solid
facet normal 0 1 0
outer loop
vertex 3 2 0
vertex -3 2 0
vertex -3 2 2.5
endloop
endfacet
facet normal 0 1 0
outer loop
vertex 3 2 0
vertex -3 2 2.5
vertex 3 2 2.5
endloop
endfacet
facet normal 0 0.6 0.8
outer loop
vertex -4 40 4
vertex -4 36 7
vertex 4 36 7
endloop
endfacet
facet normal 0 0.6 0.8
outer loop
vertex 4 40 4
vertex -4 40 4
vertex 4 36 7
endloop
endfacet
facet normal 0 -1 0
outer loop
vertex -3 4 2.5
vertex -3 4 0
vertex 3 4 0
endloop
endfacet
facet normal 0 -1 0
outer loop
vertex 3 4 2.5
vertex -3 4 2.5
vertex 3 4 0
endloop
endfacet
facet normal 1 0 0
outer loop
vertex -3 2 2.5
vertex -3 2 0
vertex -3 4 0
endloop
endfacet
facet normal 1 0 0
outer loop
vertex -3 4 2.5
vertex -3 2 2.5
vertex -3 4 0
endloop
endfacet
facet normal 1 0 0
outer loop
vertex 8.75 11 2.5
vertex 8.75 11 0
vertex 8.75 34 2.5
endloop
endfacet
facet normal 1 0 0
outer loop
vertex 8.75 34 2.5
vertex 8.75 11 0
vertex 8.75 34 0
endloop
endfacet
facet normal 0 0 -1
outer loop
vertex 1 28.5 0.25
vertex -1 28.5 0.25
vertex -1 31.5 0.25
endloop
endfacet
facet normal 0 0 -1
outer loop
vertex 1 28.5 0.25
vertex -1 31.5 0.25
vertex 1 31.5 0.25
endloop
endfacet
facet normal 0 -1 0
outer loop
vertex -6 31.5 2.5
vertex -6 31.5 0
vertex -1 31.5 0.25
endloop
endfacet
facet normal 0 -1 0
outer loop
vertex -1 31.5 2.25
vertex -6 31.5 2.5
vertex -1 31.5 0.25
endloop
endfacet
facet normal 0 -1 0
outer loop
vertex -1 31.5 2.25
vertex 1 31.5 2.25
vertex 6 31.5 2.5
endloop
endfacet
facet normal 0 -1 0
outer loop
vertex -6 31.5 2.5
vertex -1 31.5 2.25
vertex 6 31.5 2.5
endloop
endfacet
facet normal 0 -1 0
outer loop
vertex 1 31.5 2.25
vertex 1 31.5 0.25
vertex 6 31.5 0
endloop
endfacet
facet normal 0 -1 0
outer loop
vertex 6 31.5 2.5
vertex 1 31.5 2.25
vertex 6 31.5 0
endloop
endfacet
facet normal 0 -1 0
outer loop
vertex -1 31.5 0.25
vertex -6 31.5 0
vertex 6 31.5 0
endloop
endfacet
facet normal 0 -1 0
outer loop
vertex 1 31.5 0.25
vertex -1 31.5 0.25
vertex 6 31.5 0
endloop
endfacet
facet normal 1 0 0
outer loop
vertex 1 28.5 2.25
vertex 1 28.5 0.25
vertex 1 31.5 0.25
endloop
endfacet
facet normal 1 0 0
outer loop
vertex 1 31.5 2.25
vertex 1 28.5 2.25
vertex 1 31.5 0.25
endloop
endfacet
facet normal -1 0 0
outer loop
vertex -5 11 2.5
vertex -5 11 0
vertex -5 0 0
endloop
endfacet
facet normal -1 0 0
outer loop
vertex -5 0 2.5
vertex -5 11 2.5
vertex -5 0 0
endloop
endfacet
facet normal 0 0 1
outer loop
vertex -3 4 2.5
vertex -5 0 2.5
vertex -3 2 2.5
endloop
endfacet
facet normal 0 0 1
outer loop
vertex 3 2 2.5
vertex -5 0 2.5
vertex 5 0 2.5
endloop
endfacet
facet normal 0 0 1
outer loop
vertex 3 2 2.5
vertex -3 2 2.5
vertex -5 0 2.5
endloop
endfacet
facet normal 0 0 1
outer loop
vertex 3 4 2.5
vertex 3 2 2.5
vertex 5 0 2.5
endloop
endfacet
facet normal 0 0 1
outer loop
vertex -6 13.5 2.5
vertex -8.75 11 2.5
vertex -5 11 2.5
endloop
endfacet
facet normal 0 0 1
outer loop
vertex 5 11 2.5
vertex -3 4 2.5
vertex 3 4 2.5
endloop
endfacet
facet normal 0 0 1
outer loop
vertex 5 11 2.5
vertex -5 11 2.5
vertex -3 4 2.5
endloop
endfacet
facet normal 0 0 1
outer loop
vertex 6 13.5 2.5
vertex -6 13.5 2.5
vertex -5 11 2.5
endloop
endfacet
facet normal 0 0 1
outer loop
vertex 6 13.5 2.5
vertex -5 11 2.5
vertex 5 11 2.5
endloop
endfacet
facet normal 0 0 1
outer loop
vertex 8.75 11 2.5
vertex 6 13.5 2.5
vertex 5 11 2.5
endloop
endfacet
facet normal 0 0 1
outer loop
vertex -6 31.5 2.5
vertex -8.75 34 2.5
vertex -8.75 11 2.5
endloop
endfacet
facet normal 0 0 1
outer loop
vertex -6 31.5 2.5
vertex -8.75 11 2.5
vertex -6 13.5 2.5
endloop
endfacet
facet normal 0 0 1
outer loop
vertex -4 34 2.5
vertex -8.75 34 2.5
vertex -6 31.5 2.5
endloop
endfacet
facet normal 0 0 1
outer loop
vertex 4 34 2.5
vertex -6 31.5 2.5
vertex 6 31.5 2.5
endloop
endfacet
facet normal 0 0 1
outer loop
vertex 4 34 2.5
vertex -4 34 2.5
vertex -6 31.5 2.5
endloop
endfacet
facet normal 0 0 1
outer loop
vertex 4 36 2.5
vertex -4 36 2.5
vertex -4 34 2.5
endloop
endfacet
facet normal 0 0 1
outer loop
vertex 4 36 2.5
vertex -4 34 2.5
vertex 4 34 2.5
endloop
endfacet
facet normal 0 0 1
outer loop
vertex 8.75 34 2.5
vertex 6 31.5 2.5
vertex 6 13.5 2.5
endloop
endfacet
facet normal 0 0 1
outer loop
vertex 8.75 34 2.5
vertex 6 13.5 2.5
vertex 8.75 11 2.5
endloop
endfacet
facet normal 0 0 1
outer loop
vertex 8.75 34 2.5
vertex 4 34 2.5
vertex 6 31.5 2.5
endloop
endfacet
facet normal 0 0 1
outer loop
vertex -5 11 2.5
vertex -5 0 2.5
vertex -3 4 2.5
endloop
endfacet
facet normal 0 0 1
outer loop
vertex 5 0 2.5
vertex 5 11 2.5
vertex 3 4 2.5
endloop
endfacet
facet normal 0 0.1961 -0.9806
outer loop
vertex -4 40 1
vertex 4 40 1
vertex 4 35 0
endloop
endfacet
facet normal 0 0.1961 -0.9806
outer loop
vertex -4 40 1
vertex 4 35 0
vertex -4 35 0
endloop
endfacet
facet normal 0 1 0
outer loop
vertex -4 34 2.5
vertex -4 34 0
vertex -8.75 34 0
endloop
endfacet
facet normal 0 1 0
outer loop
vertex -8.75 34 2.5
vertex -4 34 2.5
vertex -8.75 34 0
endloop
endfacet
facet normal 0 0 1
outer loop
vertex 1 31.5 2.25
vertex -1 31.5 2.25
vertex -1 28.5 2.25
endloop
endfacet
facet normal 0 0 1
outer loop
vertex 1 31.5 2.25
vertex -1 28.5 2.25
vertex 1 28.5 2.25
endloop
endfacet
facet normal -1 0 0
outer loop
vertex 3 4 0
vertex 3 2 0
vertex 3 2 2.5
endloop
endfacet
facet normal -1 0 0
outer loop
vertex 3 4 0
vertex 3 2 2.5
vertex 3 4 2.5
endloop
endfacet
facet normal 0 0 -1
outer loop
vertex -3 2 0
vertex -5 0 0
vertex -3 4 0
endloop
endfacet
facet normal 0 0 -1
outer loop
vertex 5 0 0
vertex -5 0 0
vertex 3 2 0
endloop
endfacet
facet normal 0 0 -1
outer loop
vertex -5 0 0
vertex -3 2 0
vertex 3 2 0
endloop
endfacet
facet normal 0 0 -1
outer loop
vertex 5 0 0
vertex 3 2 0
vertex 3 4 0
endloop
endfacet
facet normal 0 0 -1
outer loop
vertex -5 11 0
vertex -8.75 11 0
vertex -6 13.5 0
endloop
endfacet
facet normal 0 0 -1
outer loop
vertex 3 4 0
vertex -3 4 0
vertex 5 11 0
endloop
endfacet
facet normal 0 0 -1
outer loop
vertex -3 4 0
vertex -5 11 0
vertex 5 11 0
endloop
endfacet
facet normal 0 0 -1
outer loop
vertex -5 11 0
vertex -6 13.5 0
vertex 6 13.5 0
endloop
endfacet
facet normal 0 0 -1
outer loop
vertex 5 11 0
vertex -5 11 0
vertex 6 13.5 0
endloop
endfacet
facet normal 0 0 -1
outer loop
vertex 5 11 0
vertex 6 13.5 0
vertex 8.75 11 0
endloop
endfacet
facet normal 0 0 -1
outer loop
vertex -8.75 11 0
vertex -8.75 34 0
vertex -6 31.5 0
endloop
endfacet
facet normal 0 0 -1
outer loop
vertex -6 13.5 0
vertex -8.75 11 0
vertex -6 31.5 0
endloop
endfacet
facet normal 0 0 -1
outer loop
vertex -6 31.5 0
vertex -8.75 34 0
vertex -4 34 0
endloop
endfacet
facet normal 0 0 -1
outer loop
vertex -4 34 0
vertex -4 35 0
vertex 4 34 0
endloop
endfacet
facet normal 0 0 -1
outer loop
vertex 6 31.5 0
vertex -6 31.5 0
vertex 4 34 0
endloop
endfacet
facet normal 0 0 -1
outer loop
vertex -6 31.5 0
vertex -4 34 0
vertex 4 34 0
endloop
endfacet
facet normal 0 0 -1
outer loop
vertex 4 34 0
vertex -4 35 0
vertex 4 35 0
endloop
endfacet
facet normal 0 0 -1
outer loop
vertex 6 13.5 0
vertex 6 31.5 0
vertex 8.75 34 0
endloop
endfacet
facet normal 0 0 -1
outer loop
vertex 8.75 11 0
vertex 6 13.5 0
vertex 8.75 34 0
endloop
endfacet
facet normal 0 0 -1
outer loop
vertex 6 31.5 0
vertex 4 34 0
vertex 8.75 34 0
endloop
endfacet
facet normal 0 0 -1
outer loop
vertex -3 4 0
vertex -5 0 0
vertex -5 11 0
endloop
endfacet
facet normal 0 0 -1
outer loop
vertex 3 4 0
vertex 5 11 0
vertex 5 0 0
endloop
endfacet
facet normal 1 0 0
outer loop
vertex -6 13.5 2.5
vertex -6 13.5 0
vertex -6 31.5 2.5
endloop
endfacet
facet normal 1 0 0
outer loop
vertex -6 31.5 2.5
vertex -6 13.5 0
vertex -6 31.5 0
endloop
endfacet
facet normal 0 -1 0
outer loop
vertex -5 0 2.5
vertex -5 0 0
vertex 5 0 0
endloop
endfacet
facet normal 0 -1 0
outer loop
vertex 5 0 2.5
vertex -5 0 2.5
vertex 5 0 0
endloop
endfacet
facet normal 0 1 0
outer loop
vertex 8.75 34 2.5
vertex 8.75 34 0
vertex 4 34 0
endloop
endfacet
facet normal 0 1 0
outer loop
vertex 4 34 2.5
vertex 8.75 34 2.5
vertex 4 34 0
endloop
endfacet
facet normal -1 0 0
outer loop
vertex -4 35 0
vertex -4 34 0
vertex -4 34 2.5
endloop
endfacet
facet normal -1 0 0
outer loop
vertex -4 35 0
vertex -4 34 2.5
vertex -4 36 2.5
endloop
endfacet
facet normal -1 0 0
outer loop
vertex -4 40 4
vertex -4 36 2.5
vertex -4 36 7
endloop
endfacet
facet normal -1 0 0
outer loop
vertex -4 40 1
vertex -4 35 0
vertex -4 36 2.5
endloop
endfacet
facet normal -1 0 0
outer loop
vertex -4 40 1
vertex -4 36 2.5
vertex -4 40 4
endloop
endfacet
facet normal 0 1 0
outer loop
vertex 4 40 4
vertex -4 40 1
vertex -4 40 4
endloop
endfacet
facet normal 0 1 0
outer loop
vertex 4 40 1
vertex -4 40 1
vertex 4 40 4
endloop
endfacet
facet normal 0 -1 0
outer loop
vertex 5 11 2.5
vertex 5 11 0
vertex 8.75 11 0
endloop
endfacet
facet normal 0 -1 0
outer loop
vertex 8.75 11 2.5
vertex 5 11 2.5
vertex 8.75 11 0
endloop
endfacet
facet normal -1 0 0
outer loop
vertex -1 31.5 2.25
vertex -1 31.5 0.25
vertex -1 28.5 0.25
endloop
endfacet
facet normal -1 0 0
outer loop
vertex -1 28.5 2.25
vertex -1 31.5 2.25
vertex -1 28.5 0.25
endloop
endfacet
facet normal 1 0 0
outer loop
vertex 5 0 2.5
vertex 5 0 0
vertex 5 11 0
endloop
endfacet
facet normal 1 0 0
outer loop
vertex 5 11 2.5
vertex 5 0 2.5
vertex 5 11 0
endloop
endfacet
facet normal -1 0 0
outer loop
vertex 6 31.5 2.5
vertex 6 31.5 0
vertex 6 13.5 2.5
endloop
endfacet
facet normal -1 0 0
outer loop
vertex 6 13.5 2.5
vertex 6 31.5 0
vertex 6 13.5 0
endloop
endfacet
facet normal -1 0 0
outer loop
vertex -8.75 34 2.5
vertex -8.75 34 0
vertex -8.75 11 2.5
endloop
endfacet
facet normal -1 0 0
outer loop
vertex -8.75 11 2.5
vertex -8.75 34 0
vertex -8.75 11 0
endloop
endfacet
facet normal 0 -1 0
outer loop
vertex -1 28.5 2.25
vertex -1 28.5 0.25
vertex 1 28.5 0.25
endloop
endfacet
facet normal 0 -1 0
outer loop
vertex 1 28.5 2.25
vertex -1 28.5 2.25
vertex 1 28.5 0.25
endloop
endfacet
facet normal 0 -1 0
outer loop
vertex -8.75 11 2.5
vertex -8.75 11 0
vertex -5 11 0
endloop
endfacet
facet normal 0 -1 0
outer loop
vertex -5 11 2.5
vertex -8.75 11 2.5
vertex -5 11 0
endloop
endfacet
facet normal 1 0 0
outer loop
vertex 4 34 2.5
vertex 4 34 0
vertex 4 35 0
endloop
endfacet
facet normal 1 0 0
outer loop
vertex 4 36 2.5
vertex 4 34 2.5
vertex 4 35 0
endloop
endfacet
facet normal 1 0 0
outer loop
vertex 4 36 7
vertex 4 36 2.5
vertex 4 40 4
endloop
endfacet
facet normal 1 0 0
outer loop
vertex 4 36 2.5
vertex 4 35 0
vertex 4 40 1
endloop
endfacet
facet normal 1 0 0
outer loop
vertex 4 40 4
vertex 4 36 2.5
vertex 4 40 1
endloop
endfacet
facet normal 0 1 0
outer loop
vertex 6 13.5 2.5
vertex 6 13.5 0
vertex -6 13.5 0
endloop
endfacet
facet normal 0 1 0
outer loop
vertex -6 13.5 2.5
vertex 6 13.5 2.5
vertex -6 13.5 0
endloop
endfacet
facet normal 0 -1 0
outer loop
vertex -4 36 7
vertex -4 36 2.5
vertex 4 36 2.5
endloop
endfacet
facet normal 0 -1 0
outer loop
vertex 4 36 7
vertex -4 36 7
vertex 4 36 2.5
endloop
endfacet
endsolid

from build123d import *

# Parameters (mm, degrees)
F0_W     = 6
F0_H     = 2
F1_DEPTH = 2.5
F2_W     = 8
F2_H     = 4
F3_DEPTH = 4.5
F4_SIZE2 = 3.99999
F4_SIZE  = 2.99999
F5_SIZE2 = 1
F5_SIZE  = 5
F6_W     = 2
F6_H     = 3
F7_DEPTH = 0.25
F8_W     = 2
F8_H     = 3
F9_DEPTH = 0.25


# Not quite as in the source:
# - a fillet or chamfer is up to 0.001 mm smaller than in the source, because OpenCascade refuses the exact size


with BuildPart() as f1:
    # F0 (on Top) → F1 (new body)
    with BuildSketch(Plane.XY):
        Polygon((-5, 11), (-5, 0), (5, 0), (5, 11), (8.75, 11), (8.75, 34), (4, 34), (4, 40), (-4, 40), (-4, 34), (-8.75, 34), (-8.75, 11), align=None)
        with Locations((0, 3)):
            Rectangle(F0_W, F0_H, mode=Mode.SUBTRACT)
        Polygon((-6, 13.5), (-6, 31.5), (-1, 31.5), (-1, 28.5), (1, 28.5), (1, 31.5), (6, 31.5), (6, 13.5), align=None, mode=Mode.SUBTRACT)
    extrude(amount=F1_DEPTH)

    # F2 (on face) → F3 (join)
    with BuildSketch(Plane.XY.offset(2.5)):
        with Locations((0, 38)):
            Rectangle(F2_W, F2_H)
    extrude(amount=F3_DEPTH)

    # F4 (size 3 and 4 in the source; OpenCascade refuses exactly that, so slightly less here)
    f4_edges = [f1.edges().sort_by_distance(p)[0] for p in [
        (0, 40, 7),
    ]]
    f4_side = f1.faces().sort_by_distance((0, 40, 3.5))[0]
    chamfer(f4_edges, length=F4_SIZE, length2=F4_SIZE2, reference=f4_side)

    # F5
    f5_edges = [f1.edges().sort_by_distance(p)[0] for p in [
        (0, 40, 0),
    ]]
    f5_side = f1.faces().sort_by_distance((-4.563394, 5.5, 0))[0]
    chamfer(f5_edges, length=F5_SIZE, length2=F5_SIZE2, reference=f5_side)

    # F6 (on face) → F7 (cut)
    with BuildSketch(Plane.XY.offset(2.5)):
        with Locations((0, 30)):
            Rectangle(F6_W, F6_H)
    extrude(amount=-F7_DEPTH, mode=Mode.SUBTRACT)

    # F8 (on face) → F9 (cut)
    with BuildSketch(Plane(origin=(0, 0, 0), x_dir=(1, 0, 0), z_dir=(0, 0, -1))):
        with Locations((0, -30)):
            Rectangle(F8_W, F8_H)
    extrude(amount=-F9_DEPTH, mode=Mode.SUBTRACT)


solid = f1.part
